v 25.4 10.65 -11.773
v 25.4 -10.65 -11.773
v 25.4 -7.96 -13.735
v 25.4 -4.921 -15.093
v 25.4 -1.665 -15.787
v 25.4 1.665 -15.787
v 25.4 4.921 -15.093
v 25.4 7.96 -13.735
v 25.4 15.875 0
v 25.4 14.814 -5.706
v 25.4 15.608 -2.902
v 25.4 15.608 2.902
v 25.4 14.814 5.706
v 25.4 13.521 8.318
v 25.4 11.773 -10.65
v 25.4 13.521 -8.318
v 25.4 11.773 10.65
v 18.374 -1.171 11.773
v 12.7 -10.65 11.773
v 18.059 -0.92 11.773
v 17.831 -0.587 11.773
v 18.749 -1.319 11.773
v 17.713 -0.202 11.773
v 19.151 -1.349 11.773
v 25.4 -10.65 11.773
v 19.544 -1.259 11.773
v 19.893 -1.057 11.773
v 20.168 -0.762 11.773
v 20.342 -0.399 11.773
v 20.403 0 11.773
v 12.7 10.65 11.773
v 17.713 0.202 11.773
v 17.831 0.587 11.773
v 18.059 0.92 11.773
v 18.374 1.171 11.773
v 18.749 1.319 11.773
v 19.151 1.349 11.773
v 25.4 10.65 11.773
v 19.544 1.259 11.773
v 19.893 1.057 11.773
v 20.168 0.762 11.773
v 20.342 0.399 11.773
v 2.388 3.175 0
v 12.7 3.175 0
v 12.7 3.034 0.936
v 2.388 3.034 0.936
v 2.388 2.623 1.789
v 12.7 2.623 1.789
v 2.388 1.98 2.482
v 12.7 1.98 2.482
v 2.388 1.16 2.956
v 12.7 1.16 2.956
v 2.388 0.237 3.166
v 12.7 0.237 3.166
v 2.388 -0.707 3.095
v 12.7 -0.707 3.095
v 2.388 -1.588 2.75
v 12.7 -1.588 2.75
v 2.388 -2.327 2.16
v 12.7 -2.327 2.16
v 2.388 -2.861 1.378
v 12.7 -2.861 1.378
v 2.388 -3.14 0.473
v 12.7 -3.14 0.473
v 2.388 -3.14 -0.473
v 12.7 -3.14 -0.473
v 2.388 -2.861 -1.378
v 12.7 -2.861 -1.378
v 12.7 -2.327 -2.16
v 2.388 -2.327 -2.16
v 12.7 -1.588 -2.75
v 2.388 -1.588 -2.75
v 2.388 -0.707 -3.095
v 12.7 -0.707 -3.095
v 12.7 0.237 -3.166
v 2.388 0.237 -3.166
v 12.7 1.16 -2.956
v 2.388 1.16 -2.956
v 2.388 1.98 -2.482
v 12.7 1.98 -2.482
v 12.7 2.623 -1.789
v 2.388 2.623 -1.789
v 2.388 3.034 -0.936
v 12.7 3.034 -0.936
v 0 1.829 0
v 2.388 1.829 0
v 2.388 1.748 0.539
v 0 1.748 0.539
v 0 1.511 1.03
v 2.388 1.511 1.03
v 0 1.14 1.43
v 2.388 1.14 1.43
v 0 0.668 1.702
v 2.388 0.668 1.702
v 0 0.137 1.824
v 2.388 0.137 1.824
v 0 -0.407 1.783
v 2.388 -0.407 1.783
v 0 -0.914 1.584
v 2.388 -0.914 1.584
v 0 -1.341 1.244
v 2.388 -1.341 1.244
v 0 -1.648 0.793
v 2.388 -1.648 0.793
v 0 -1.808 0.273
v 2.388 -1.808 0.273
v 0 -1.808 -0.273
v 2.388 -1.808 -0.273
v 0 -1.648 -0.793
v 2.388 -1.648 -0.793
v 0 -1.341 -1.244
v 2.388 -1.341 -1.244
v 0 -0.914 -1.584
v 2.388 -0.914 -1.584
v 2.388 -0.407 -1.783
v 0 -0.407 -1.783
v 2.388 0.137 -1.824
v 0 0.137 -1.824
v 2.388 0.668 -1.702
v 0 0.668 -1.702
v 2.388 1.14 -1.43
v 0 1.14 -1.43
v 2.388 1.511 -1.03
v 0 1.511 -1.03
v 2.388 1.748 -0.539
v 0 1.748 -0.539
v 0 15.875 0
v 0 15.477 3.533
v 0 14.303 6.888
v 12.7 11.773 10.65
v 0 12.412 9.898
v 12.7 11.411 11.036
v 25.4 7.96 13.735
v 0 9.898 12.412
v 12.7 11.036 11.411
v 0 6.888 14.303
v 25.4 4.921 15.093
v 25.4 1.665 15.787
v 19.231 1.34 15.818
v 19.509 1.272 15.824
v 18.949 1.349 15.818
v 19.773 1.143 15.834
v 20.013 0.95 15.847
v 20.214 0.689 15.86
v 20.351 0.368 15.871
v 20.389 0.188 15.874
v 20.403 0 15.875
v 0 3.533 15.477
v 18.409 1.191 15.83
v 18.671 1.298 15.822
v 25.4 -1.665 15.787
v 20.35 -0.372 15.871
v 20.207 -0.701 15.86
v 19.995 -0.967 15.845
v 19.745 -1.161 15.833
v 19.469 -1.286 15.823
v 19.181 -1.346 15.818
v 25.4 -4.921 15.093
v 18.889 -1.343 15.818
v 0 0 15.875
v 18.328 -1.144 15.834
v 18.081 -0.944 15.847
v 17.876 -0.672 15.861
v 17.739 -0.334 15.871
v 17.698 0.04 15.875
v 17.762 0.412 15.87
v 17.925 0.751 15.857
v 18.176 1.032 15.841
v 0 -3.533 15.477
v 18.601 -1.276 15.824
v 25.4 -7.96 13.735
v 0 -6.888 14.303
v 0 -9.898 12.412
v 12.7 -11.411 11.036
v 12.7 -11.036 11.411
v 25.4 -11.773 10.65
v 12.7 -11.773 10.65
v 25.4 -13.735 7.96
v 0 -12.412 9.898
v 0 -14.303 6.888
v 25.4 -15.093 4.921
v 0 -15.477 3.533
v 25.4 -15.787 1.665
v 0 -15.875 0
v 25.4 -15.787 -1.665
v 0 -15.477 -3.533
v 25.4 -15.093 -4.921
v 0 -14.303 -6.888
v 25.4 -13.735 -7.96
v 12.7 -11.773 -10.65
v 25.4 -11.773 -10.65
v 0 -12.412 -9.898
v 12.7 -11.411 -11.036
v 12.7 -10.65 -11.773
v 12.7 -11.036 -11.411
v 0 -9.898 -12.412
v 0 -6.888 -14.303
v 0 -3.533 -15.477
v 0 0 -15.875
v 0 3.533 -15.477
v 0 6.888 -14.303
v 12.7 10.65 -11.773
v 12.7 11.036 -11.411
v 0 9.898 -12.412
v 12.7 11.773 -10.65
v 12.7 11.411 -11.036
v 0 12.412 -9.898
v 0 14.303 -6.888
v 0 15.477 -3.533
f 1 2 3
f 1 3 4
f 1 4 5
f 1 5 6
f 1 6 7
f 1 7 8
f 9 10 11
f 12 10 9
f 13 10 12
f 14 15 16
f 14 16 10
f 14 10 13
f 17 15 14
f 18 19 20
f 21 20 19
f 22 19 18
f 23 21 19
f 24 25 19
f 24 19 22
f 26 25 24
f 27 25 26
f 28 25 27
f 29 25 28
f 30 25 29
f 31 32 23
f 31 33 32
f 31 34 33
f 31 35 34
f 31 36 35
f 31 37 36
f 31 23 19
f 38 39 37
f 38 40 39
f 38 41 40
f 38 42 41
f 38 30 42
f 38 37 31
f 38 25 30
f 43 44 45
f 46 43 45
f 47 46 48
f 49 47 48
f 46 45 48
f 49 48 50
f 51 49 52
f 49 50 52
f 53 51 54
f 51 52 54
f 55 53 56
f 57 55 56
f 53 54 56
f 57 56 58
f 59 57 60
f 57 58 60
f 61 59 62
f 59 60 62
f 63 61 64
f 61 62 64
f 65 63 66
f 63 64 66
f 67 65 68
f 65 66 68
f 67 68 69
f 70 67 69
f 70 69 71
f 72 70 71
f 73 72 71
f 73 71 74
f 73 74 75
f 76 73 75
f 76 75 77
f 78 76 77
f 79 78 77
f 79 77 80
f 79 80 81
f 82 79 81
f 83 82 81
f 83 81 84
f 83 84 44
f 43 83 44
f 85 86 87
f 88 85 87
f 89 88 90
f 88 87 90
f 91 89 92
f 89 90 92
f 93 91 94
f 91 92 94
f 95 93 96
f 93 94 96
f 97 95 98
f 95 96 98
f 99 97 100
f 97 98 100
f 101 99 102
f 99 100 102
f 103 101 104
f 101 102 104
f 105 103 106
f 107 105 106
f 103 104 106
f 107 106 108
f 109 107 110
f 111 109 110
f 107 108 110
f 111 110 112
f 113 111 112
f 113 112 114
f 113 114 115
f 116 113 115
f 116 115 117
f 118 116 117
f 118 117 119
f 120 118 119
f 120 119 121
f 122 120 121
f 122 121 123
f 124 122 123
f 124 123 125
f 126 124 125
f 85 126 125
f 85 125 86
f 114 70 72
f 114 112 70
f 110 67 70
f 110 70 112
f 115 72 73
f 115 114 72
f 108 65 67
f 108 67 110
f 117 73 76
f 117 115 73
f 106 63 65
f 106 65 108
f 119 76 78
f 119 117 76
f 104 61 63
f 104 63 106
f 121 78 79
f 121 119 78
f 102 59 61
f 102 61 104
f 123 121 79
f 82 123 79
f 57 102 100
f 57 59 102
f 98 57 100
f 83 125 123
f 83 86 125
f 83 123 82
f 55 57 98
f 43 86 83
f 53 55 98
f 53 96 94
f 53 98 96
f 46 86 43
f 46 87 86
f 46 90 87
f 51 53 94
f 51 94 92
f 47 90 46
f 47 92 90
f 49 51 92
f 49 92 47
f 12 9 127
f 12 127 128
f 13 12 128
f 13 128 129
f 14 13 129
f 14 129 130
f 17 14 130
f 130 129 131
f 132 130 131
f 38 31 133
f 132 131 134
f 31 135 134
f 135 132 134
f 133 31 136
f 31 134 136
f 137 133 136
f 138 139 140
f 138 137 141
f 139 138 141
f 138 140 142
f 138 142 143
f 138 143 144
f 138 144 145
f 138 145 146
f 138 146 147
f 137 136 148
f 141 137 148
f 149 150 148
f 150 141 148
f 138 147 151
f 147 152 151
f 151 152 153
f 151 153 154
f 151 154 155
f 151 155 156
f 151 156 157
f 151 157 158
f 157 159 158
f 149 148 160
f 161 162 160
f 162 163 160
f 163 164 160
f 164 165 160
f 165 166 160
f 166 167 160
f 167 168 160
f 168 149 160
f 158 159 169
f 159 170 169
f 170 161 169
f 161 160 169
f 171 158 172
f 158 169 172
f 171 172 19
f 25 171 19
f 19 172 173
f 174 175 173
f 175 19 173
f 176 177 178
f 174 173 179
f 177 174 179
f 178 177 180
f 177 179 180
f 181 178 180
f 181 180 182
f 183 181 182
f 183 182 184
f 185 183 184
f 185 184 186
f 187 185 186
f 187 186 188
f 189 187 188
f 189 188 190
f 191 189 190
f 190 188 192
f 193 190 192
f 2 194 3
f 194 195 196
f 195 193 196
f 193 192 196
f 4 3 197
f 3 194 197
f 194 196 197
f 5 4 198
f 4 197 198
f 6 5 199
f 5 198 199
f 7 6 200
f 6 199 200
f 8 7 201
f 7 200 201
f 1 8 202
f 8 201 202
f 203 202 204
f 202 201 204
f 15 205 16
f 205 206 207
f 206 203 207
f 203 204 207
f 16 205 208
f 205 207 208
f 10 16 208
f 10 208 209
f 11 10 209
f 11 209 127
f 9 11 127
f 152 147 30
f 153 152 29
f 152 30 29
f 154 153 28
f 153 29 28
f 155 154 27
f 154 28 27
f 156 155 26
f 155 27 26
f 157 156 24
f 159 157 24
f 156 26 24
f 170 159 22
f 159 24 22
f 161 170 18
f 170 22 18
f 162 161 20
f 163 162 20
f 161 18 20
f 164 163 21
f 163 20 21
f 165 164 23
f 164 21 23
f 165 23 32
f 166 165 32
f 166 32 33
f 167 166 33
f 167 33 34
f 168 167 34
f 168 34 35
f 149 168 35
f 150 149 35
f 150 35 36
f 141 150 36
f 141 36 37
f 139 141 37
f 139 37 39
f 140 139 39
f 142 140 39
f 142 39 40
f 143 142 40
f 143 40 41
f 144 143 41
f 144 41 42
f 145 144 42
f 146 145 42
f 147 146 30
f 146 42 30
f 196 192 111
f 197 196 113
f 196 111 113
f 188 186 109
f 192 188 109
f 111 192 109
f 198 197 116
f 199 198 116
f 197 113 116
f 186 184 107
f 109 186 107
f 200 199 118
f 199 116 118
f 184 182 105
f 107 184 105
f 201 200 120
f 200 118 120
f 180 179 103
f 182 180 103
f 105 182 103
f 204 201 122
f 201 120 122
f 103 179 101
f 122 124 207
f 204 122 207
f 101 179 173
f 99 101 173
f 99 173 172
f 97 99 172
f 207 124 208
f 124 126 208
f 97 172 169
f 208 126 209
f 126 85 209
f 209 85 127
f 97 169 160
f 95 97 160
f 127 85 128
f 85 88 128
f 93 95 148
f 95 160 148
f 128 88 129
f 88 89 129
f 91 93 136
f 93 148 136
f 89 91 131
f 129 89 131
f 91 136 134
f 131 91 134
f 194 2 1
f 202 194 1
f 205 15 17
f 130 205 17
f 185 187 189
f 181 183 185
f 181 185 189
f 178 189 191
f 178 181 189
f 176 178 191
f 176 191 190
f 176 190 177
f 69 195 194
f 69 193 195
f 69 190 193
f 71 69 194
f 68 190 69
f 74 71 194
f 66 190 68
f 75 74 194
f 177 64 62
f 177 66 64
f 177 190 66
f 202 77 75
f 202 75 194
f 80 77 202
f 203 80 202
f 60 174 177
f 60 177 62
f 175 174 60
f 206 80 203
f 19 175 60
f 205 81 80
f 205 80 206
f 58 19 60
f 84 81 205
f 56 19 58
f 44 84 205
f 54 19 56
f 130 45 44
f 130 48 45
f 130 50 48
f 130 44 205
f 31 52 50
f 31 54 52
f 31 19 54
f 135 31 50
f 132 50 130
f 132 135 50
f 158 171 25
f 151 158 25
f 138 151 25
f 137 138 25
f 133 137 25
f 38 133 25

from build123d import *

# Parameters (mm, degrees)
F0_R     = 15.875
F1_DEPTH = 25.4
F2_W     = 23.5458
F2_H     = 23.5458
F3_DEPTH = 12.7
F4_R     = 3.175
F5_DEPTH = 23.0124
F6_R     = 1.8288
F7_DEPTH = 12.701
F8_R     = 1.35255
F9_DEPTH = 4.1031


with BuildPart() as f1:
    # F0 (on Right) → F1 (new body)
    with BuildSketch(Plane.YZ):
        Circle(F0_R)
    extrude(amount=F1_DEPTH)

    # F2 (on face) → F3 (cut)
    with BuildSketch(Plane.YZ.offset(25.4)):
        Rectangle(F2_W, F2_H)
    extrude(amount=-F3_DEPTH, mode=Mode.SUBTRACT)

    # F4 (on face) → F5 (cut)
    with BuildSketch(Plane.YZ.offset(25.4)):
        Circle(F4_R)
    extrude(amount=-F5_DEPTH, mode=Mode.SUBTRACT)

    # F6 (on face) → F7 (cut, through all)
    with BuildSketch(Plane.YZ.offset(12.7)):
        Circle(F6_R)
    extrude(amount=-F7_DEPTH, mode=Mode.SUBTRACT)

    # F8 (on face) → F9 (cut, through all)
    with BuildSketch(Plane(origin=(0, 0, 11.7729), x_dir=(1, 0, 0), z_dir=(0, 0, -1))):
        with Locations((19.05, 0)):
            Circle(F8_R)
    extrude(amount=-F9_DEPTH, mode=Mode.SUBTRACT)


solid = f1.part
